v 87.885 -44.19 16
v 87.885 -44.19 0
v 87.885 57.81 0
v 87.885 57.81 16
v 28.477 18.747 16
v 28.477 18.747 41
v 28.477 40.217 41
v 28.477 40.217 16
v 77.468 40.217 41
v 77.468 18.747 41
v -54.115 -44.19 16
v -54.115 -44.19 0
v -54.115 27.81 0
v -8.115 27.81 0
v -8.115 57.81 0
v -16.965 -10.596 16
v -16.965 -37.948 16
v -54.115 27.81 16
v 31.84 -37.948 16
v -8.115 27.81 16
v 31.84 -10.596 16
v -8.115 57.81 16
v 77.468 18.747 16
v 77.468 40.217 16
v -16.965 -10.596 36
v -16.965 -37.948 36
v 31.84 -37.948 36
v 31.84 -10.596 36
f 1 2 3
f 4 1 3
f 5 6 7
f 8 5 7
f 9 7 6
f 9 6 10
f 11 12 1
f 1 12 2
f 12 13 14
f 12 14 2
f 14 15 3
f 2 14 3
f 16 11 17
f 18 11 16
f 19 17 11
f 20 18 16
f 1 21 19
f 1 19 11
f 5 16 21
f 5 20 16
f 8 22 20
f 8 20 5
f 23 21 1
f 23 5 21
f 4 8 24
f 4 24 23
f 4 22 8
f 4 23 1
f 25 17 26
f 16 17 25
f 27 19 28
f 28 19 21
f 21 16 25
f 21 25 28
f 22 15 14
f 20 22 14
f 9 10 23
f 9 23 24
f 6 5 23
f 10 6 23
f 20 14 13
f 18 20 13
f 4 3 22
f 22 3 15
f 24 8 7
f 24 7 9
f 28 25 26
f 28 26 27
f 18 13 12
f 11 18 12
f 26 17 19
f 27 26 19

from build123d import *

# Parameters (mm, degrees)
F1_DEPTH = 16
F2_W     = 48.991163
F2_H     = 21.469762
F3_DEPTH = 25
F4_W     = 48.804743
F4_H     = 27.352094
F5_DEPTH = 20


with BuildPart() as f1:
    # F0 (on Top) → F1 (new body)
    with BuildSketch(Plane.XY):
        Polygon((87.884769, 57.809951), (-8.115231, 57.809951), (-8.115231, 27.809951), (-54.115231, 27.809951), (-54.115231, -44.190049), (87.884769, -44.190049), align=None)
    extrude(amount=F1_DEPTH)

    # F2 (on face) → F3 (join)
    with BuildSketch(Plane.XY.offset(16)):
        with Locations((52.972657, 29.482209)):
            Rectangle(F2_W, F2_H)
    extrude(amount=F3_DEPTH)

    # F4 (on face) → F5 (join)
    with BuildSketch(Plane.XY.offset(16)):
        with Locations((7.437617, -24.271876)):
            Rectangle(F4_W, F4_H)
    extrude(amount=F5_DEPTH)


solid = f1.part
